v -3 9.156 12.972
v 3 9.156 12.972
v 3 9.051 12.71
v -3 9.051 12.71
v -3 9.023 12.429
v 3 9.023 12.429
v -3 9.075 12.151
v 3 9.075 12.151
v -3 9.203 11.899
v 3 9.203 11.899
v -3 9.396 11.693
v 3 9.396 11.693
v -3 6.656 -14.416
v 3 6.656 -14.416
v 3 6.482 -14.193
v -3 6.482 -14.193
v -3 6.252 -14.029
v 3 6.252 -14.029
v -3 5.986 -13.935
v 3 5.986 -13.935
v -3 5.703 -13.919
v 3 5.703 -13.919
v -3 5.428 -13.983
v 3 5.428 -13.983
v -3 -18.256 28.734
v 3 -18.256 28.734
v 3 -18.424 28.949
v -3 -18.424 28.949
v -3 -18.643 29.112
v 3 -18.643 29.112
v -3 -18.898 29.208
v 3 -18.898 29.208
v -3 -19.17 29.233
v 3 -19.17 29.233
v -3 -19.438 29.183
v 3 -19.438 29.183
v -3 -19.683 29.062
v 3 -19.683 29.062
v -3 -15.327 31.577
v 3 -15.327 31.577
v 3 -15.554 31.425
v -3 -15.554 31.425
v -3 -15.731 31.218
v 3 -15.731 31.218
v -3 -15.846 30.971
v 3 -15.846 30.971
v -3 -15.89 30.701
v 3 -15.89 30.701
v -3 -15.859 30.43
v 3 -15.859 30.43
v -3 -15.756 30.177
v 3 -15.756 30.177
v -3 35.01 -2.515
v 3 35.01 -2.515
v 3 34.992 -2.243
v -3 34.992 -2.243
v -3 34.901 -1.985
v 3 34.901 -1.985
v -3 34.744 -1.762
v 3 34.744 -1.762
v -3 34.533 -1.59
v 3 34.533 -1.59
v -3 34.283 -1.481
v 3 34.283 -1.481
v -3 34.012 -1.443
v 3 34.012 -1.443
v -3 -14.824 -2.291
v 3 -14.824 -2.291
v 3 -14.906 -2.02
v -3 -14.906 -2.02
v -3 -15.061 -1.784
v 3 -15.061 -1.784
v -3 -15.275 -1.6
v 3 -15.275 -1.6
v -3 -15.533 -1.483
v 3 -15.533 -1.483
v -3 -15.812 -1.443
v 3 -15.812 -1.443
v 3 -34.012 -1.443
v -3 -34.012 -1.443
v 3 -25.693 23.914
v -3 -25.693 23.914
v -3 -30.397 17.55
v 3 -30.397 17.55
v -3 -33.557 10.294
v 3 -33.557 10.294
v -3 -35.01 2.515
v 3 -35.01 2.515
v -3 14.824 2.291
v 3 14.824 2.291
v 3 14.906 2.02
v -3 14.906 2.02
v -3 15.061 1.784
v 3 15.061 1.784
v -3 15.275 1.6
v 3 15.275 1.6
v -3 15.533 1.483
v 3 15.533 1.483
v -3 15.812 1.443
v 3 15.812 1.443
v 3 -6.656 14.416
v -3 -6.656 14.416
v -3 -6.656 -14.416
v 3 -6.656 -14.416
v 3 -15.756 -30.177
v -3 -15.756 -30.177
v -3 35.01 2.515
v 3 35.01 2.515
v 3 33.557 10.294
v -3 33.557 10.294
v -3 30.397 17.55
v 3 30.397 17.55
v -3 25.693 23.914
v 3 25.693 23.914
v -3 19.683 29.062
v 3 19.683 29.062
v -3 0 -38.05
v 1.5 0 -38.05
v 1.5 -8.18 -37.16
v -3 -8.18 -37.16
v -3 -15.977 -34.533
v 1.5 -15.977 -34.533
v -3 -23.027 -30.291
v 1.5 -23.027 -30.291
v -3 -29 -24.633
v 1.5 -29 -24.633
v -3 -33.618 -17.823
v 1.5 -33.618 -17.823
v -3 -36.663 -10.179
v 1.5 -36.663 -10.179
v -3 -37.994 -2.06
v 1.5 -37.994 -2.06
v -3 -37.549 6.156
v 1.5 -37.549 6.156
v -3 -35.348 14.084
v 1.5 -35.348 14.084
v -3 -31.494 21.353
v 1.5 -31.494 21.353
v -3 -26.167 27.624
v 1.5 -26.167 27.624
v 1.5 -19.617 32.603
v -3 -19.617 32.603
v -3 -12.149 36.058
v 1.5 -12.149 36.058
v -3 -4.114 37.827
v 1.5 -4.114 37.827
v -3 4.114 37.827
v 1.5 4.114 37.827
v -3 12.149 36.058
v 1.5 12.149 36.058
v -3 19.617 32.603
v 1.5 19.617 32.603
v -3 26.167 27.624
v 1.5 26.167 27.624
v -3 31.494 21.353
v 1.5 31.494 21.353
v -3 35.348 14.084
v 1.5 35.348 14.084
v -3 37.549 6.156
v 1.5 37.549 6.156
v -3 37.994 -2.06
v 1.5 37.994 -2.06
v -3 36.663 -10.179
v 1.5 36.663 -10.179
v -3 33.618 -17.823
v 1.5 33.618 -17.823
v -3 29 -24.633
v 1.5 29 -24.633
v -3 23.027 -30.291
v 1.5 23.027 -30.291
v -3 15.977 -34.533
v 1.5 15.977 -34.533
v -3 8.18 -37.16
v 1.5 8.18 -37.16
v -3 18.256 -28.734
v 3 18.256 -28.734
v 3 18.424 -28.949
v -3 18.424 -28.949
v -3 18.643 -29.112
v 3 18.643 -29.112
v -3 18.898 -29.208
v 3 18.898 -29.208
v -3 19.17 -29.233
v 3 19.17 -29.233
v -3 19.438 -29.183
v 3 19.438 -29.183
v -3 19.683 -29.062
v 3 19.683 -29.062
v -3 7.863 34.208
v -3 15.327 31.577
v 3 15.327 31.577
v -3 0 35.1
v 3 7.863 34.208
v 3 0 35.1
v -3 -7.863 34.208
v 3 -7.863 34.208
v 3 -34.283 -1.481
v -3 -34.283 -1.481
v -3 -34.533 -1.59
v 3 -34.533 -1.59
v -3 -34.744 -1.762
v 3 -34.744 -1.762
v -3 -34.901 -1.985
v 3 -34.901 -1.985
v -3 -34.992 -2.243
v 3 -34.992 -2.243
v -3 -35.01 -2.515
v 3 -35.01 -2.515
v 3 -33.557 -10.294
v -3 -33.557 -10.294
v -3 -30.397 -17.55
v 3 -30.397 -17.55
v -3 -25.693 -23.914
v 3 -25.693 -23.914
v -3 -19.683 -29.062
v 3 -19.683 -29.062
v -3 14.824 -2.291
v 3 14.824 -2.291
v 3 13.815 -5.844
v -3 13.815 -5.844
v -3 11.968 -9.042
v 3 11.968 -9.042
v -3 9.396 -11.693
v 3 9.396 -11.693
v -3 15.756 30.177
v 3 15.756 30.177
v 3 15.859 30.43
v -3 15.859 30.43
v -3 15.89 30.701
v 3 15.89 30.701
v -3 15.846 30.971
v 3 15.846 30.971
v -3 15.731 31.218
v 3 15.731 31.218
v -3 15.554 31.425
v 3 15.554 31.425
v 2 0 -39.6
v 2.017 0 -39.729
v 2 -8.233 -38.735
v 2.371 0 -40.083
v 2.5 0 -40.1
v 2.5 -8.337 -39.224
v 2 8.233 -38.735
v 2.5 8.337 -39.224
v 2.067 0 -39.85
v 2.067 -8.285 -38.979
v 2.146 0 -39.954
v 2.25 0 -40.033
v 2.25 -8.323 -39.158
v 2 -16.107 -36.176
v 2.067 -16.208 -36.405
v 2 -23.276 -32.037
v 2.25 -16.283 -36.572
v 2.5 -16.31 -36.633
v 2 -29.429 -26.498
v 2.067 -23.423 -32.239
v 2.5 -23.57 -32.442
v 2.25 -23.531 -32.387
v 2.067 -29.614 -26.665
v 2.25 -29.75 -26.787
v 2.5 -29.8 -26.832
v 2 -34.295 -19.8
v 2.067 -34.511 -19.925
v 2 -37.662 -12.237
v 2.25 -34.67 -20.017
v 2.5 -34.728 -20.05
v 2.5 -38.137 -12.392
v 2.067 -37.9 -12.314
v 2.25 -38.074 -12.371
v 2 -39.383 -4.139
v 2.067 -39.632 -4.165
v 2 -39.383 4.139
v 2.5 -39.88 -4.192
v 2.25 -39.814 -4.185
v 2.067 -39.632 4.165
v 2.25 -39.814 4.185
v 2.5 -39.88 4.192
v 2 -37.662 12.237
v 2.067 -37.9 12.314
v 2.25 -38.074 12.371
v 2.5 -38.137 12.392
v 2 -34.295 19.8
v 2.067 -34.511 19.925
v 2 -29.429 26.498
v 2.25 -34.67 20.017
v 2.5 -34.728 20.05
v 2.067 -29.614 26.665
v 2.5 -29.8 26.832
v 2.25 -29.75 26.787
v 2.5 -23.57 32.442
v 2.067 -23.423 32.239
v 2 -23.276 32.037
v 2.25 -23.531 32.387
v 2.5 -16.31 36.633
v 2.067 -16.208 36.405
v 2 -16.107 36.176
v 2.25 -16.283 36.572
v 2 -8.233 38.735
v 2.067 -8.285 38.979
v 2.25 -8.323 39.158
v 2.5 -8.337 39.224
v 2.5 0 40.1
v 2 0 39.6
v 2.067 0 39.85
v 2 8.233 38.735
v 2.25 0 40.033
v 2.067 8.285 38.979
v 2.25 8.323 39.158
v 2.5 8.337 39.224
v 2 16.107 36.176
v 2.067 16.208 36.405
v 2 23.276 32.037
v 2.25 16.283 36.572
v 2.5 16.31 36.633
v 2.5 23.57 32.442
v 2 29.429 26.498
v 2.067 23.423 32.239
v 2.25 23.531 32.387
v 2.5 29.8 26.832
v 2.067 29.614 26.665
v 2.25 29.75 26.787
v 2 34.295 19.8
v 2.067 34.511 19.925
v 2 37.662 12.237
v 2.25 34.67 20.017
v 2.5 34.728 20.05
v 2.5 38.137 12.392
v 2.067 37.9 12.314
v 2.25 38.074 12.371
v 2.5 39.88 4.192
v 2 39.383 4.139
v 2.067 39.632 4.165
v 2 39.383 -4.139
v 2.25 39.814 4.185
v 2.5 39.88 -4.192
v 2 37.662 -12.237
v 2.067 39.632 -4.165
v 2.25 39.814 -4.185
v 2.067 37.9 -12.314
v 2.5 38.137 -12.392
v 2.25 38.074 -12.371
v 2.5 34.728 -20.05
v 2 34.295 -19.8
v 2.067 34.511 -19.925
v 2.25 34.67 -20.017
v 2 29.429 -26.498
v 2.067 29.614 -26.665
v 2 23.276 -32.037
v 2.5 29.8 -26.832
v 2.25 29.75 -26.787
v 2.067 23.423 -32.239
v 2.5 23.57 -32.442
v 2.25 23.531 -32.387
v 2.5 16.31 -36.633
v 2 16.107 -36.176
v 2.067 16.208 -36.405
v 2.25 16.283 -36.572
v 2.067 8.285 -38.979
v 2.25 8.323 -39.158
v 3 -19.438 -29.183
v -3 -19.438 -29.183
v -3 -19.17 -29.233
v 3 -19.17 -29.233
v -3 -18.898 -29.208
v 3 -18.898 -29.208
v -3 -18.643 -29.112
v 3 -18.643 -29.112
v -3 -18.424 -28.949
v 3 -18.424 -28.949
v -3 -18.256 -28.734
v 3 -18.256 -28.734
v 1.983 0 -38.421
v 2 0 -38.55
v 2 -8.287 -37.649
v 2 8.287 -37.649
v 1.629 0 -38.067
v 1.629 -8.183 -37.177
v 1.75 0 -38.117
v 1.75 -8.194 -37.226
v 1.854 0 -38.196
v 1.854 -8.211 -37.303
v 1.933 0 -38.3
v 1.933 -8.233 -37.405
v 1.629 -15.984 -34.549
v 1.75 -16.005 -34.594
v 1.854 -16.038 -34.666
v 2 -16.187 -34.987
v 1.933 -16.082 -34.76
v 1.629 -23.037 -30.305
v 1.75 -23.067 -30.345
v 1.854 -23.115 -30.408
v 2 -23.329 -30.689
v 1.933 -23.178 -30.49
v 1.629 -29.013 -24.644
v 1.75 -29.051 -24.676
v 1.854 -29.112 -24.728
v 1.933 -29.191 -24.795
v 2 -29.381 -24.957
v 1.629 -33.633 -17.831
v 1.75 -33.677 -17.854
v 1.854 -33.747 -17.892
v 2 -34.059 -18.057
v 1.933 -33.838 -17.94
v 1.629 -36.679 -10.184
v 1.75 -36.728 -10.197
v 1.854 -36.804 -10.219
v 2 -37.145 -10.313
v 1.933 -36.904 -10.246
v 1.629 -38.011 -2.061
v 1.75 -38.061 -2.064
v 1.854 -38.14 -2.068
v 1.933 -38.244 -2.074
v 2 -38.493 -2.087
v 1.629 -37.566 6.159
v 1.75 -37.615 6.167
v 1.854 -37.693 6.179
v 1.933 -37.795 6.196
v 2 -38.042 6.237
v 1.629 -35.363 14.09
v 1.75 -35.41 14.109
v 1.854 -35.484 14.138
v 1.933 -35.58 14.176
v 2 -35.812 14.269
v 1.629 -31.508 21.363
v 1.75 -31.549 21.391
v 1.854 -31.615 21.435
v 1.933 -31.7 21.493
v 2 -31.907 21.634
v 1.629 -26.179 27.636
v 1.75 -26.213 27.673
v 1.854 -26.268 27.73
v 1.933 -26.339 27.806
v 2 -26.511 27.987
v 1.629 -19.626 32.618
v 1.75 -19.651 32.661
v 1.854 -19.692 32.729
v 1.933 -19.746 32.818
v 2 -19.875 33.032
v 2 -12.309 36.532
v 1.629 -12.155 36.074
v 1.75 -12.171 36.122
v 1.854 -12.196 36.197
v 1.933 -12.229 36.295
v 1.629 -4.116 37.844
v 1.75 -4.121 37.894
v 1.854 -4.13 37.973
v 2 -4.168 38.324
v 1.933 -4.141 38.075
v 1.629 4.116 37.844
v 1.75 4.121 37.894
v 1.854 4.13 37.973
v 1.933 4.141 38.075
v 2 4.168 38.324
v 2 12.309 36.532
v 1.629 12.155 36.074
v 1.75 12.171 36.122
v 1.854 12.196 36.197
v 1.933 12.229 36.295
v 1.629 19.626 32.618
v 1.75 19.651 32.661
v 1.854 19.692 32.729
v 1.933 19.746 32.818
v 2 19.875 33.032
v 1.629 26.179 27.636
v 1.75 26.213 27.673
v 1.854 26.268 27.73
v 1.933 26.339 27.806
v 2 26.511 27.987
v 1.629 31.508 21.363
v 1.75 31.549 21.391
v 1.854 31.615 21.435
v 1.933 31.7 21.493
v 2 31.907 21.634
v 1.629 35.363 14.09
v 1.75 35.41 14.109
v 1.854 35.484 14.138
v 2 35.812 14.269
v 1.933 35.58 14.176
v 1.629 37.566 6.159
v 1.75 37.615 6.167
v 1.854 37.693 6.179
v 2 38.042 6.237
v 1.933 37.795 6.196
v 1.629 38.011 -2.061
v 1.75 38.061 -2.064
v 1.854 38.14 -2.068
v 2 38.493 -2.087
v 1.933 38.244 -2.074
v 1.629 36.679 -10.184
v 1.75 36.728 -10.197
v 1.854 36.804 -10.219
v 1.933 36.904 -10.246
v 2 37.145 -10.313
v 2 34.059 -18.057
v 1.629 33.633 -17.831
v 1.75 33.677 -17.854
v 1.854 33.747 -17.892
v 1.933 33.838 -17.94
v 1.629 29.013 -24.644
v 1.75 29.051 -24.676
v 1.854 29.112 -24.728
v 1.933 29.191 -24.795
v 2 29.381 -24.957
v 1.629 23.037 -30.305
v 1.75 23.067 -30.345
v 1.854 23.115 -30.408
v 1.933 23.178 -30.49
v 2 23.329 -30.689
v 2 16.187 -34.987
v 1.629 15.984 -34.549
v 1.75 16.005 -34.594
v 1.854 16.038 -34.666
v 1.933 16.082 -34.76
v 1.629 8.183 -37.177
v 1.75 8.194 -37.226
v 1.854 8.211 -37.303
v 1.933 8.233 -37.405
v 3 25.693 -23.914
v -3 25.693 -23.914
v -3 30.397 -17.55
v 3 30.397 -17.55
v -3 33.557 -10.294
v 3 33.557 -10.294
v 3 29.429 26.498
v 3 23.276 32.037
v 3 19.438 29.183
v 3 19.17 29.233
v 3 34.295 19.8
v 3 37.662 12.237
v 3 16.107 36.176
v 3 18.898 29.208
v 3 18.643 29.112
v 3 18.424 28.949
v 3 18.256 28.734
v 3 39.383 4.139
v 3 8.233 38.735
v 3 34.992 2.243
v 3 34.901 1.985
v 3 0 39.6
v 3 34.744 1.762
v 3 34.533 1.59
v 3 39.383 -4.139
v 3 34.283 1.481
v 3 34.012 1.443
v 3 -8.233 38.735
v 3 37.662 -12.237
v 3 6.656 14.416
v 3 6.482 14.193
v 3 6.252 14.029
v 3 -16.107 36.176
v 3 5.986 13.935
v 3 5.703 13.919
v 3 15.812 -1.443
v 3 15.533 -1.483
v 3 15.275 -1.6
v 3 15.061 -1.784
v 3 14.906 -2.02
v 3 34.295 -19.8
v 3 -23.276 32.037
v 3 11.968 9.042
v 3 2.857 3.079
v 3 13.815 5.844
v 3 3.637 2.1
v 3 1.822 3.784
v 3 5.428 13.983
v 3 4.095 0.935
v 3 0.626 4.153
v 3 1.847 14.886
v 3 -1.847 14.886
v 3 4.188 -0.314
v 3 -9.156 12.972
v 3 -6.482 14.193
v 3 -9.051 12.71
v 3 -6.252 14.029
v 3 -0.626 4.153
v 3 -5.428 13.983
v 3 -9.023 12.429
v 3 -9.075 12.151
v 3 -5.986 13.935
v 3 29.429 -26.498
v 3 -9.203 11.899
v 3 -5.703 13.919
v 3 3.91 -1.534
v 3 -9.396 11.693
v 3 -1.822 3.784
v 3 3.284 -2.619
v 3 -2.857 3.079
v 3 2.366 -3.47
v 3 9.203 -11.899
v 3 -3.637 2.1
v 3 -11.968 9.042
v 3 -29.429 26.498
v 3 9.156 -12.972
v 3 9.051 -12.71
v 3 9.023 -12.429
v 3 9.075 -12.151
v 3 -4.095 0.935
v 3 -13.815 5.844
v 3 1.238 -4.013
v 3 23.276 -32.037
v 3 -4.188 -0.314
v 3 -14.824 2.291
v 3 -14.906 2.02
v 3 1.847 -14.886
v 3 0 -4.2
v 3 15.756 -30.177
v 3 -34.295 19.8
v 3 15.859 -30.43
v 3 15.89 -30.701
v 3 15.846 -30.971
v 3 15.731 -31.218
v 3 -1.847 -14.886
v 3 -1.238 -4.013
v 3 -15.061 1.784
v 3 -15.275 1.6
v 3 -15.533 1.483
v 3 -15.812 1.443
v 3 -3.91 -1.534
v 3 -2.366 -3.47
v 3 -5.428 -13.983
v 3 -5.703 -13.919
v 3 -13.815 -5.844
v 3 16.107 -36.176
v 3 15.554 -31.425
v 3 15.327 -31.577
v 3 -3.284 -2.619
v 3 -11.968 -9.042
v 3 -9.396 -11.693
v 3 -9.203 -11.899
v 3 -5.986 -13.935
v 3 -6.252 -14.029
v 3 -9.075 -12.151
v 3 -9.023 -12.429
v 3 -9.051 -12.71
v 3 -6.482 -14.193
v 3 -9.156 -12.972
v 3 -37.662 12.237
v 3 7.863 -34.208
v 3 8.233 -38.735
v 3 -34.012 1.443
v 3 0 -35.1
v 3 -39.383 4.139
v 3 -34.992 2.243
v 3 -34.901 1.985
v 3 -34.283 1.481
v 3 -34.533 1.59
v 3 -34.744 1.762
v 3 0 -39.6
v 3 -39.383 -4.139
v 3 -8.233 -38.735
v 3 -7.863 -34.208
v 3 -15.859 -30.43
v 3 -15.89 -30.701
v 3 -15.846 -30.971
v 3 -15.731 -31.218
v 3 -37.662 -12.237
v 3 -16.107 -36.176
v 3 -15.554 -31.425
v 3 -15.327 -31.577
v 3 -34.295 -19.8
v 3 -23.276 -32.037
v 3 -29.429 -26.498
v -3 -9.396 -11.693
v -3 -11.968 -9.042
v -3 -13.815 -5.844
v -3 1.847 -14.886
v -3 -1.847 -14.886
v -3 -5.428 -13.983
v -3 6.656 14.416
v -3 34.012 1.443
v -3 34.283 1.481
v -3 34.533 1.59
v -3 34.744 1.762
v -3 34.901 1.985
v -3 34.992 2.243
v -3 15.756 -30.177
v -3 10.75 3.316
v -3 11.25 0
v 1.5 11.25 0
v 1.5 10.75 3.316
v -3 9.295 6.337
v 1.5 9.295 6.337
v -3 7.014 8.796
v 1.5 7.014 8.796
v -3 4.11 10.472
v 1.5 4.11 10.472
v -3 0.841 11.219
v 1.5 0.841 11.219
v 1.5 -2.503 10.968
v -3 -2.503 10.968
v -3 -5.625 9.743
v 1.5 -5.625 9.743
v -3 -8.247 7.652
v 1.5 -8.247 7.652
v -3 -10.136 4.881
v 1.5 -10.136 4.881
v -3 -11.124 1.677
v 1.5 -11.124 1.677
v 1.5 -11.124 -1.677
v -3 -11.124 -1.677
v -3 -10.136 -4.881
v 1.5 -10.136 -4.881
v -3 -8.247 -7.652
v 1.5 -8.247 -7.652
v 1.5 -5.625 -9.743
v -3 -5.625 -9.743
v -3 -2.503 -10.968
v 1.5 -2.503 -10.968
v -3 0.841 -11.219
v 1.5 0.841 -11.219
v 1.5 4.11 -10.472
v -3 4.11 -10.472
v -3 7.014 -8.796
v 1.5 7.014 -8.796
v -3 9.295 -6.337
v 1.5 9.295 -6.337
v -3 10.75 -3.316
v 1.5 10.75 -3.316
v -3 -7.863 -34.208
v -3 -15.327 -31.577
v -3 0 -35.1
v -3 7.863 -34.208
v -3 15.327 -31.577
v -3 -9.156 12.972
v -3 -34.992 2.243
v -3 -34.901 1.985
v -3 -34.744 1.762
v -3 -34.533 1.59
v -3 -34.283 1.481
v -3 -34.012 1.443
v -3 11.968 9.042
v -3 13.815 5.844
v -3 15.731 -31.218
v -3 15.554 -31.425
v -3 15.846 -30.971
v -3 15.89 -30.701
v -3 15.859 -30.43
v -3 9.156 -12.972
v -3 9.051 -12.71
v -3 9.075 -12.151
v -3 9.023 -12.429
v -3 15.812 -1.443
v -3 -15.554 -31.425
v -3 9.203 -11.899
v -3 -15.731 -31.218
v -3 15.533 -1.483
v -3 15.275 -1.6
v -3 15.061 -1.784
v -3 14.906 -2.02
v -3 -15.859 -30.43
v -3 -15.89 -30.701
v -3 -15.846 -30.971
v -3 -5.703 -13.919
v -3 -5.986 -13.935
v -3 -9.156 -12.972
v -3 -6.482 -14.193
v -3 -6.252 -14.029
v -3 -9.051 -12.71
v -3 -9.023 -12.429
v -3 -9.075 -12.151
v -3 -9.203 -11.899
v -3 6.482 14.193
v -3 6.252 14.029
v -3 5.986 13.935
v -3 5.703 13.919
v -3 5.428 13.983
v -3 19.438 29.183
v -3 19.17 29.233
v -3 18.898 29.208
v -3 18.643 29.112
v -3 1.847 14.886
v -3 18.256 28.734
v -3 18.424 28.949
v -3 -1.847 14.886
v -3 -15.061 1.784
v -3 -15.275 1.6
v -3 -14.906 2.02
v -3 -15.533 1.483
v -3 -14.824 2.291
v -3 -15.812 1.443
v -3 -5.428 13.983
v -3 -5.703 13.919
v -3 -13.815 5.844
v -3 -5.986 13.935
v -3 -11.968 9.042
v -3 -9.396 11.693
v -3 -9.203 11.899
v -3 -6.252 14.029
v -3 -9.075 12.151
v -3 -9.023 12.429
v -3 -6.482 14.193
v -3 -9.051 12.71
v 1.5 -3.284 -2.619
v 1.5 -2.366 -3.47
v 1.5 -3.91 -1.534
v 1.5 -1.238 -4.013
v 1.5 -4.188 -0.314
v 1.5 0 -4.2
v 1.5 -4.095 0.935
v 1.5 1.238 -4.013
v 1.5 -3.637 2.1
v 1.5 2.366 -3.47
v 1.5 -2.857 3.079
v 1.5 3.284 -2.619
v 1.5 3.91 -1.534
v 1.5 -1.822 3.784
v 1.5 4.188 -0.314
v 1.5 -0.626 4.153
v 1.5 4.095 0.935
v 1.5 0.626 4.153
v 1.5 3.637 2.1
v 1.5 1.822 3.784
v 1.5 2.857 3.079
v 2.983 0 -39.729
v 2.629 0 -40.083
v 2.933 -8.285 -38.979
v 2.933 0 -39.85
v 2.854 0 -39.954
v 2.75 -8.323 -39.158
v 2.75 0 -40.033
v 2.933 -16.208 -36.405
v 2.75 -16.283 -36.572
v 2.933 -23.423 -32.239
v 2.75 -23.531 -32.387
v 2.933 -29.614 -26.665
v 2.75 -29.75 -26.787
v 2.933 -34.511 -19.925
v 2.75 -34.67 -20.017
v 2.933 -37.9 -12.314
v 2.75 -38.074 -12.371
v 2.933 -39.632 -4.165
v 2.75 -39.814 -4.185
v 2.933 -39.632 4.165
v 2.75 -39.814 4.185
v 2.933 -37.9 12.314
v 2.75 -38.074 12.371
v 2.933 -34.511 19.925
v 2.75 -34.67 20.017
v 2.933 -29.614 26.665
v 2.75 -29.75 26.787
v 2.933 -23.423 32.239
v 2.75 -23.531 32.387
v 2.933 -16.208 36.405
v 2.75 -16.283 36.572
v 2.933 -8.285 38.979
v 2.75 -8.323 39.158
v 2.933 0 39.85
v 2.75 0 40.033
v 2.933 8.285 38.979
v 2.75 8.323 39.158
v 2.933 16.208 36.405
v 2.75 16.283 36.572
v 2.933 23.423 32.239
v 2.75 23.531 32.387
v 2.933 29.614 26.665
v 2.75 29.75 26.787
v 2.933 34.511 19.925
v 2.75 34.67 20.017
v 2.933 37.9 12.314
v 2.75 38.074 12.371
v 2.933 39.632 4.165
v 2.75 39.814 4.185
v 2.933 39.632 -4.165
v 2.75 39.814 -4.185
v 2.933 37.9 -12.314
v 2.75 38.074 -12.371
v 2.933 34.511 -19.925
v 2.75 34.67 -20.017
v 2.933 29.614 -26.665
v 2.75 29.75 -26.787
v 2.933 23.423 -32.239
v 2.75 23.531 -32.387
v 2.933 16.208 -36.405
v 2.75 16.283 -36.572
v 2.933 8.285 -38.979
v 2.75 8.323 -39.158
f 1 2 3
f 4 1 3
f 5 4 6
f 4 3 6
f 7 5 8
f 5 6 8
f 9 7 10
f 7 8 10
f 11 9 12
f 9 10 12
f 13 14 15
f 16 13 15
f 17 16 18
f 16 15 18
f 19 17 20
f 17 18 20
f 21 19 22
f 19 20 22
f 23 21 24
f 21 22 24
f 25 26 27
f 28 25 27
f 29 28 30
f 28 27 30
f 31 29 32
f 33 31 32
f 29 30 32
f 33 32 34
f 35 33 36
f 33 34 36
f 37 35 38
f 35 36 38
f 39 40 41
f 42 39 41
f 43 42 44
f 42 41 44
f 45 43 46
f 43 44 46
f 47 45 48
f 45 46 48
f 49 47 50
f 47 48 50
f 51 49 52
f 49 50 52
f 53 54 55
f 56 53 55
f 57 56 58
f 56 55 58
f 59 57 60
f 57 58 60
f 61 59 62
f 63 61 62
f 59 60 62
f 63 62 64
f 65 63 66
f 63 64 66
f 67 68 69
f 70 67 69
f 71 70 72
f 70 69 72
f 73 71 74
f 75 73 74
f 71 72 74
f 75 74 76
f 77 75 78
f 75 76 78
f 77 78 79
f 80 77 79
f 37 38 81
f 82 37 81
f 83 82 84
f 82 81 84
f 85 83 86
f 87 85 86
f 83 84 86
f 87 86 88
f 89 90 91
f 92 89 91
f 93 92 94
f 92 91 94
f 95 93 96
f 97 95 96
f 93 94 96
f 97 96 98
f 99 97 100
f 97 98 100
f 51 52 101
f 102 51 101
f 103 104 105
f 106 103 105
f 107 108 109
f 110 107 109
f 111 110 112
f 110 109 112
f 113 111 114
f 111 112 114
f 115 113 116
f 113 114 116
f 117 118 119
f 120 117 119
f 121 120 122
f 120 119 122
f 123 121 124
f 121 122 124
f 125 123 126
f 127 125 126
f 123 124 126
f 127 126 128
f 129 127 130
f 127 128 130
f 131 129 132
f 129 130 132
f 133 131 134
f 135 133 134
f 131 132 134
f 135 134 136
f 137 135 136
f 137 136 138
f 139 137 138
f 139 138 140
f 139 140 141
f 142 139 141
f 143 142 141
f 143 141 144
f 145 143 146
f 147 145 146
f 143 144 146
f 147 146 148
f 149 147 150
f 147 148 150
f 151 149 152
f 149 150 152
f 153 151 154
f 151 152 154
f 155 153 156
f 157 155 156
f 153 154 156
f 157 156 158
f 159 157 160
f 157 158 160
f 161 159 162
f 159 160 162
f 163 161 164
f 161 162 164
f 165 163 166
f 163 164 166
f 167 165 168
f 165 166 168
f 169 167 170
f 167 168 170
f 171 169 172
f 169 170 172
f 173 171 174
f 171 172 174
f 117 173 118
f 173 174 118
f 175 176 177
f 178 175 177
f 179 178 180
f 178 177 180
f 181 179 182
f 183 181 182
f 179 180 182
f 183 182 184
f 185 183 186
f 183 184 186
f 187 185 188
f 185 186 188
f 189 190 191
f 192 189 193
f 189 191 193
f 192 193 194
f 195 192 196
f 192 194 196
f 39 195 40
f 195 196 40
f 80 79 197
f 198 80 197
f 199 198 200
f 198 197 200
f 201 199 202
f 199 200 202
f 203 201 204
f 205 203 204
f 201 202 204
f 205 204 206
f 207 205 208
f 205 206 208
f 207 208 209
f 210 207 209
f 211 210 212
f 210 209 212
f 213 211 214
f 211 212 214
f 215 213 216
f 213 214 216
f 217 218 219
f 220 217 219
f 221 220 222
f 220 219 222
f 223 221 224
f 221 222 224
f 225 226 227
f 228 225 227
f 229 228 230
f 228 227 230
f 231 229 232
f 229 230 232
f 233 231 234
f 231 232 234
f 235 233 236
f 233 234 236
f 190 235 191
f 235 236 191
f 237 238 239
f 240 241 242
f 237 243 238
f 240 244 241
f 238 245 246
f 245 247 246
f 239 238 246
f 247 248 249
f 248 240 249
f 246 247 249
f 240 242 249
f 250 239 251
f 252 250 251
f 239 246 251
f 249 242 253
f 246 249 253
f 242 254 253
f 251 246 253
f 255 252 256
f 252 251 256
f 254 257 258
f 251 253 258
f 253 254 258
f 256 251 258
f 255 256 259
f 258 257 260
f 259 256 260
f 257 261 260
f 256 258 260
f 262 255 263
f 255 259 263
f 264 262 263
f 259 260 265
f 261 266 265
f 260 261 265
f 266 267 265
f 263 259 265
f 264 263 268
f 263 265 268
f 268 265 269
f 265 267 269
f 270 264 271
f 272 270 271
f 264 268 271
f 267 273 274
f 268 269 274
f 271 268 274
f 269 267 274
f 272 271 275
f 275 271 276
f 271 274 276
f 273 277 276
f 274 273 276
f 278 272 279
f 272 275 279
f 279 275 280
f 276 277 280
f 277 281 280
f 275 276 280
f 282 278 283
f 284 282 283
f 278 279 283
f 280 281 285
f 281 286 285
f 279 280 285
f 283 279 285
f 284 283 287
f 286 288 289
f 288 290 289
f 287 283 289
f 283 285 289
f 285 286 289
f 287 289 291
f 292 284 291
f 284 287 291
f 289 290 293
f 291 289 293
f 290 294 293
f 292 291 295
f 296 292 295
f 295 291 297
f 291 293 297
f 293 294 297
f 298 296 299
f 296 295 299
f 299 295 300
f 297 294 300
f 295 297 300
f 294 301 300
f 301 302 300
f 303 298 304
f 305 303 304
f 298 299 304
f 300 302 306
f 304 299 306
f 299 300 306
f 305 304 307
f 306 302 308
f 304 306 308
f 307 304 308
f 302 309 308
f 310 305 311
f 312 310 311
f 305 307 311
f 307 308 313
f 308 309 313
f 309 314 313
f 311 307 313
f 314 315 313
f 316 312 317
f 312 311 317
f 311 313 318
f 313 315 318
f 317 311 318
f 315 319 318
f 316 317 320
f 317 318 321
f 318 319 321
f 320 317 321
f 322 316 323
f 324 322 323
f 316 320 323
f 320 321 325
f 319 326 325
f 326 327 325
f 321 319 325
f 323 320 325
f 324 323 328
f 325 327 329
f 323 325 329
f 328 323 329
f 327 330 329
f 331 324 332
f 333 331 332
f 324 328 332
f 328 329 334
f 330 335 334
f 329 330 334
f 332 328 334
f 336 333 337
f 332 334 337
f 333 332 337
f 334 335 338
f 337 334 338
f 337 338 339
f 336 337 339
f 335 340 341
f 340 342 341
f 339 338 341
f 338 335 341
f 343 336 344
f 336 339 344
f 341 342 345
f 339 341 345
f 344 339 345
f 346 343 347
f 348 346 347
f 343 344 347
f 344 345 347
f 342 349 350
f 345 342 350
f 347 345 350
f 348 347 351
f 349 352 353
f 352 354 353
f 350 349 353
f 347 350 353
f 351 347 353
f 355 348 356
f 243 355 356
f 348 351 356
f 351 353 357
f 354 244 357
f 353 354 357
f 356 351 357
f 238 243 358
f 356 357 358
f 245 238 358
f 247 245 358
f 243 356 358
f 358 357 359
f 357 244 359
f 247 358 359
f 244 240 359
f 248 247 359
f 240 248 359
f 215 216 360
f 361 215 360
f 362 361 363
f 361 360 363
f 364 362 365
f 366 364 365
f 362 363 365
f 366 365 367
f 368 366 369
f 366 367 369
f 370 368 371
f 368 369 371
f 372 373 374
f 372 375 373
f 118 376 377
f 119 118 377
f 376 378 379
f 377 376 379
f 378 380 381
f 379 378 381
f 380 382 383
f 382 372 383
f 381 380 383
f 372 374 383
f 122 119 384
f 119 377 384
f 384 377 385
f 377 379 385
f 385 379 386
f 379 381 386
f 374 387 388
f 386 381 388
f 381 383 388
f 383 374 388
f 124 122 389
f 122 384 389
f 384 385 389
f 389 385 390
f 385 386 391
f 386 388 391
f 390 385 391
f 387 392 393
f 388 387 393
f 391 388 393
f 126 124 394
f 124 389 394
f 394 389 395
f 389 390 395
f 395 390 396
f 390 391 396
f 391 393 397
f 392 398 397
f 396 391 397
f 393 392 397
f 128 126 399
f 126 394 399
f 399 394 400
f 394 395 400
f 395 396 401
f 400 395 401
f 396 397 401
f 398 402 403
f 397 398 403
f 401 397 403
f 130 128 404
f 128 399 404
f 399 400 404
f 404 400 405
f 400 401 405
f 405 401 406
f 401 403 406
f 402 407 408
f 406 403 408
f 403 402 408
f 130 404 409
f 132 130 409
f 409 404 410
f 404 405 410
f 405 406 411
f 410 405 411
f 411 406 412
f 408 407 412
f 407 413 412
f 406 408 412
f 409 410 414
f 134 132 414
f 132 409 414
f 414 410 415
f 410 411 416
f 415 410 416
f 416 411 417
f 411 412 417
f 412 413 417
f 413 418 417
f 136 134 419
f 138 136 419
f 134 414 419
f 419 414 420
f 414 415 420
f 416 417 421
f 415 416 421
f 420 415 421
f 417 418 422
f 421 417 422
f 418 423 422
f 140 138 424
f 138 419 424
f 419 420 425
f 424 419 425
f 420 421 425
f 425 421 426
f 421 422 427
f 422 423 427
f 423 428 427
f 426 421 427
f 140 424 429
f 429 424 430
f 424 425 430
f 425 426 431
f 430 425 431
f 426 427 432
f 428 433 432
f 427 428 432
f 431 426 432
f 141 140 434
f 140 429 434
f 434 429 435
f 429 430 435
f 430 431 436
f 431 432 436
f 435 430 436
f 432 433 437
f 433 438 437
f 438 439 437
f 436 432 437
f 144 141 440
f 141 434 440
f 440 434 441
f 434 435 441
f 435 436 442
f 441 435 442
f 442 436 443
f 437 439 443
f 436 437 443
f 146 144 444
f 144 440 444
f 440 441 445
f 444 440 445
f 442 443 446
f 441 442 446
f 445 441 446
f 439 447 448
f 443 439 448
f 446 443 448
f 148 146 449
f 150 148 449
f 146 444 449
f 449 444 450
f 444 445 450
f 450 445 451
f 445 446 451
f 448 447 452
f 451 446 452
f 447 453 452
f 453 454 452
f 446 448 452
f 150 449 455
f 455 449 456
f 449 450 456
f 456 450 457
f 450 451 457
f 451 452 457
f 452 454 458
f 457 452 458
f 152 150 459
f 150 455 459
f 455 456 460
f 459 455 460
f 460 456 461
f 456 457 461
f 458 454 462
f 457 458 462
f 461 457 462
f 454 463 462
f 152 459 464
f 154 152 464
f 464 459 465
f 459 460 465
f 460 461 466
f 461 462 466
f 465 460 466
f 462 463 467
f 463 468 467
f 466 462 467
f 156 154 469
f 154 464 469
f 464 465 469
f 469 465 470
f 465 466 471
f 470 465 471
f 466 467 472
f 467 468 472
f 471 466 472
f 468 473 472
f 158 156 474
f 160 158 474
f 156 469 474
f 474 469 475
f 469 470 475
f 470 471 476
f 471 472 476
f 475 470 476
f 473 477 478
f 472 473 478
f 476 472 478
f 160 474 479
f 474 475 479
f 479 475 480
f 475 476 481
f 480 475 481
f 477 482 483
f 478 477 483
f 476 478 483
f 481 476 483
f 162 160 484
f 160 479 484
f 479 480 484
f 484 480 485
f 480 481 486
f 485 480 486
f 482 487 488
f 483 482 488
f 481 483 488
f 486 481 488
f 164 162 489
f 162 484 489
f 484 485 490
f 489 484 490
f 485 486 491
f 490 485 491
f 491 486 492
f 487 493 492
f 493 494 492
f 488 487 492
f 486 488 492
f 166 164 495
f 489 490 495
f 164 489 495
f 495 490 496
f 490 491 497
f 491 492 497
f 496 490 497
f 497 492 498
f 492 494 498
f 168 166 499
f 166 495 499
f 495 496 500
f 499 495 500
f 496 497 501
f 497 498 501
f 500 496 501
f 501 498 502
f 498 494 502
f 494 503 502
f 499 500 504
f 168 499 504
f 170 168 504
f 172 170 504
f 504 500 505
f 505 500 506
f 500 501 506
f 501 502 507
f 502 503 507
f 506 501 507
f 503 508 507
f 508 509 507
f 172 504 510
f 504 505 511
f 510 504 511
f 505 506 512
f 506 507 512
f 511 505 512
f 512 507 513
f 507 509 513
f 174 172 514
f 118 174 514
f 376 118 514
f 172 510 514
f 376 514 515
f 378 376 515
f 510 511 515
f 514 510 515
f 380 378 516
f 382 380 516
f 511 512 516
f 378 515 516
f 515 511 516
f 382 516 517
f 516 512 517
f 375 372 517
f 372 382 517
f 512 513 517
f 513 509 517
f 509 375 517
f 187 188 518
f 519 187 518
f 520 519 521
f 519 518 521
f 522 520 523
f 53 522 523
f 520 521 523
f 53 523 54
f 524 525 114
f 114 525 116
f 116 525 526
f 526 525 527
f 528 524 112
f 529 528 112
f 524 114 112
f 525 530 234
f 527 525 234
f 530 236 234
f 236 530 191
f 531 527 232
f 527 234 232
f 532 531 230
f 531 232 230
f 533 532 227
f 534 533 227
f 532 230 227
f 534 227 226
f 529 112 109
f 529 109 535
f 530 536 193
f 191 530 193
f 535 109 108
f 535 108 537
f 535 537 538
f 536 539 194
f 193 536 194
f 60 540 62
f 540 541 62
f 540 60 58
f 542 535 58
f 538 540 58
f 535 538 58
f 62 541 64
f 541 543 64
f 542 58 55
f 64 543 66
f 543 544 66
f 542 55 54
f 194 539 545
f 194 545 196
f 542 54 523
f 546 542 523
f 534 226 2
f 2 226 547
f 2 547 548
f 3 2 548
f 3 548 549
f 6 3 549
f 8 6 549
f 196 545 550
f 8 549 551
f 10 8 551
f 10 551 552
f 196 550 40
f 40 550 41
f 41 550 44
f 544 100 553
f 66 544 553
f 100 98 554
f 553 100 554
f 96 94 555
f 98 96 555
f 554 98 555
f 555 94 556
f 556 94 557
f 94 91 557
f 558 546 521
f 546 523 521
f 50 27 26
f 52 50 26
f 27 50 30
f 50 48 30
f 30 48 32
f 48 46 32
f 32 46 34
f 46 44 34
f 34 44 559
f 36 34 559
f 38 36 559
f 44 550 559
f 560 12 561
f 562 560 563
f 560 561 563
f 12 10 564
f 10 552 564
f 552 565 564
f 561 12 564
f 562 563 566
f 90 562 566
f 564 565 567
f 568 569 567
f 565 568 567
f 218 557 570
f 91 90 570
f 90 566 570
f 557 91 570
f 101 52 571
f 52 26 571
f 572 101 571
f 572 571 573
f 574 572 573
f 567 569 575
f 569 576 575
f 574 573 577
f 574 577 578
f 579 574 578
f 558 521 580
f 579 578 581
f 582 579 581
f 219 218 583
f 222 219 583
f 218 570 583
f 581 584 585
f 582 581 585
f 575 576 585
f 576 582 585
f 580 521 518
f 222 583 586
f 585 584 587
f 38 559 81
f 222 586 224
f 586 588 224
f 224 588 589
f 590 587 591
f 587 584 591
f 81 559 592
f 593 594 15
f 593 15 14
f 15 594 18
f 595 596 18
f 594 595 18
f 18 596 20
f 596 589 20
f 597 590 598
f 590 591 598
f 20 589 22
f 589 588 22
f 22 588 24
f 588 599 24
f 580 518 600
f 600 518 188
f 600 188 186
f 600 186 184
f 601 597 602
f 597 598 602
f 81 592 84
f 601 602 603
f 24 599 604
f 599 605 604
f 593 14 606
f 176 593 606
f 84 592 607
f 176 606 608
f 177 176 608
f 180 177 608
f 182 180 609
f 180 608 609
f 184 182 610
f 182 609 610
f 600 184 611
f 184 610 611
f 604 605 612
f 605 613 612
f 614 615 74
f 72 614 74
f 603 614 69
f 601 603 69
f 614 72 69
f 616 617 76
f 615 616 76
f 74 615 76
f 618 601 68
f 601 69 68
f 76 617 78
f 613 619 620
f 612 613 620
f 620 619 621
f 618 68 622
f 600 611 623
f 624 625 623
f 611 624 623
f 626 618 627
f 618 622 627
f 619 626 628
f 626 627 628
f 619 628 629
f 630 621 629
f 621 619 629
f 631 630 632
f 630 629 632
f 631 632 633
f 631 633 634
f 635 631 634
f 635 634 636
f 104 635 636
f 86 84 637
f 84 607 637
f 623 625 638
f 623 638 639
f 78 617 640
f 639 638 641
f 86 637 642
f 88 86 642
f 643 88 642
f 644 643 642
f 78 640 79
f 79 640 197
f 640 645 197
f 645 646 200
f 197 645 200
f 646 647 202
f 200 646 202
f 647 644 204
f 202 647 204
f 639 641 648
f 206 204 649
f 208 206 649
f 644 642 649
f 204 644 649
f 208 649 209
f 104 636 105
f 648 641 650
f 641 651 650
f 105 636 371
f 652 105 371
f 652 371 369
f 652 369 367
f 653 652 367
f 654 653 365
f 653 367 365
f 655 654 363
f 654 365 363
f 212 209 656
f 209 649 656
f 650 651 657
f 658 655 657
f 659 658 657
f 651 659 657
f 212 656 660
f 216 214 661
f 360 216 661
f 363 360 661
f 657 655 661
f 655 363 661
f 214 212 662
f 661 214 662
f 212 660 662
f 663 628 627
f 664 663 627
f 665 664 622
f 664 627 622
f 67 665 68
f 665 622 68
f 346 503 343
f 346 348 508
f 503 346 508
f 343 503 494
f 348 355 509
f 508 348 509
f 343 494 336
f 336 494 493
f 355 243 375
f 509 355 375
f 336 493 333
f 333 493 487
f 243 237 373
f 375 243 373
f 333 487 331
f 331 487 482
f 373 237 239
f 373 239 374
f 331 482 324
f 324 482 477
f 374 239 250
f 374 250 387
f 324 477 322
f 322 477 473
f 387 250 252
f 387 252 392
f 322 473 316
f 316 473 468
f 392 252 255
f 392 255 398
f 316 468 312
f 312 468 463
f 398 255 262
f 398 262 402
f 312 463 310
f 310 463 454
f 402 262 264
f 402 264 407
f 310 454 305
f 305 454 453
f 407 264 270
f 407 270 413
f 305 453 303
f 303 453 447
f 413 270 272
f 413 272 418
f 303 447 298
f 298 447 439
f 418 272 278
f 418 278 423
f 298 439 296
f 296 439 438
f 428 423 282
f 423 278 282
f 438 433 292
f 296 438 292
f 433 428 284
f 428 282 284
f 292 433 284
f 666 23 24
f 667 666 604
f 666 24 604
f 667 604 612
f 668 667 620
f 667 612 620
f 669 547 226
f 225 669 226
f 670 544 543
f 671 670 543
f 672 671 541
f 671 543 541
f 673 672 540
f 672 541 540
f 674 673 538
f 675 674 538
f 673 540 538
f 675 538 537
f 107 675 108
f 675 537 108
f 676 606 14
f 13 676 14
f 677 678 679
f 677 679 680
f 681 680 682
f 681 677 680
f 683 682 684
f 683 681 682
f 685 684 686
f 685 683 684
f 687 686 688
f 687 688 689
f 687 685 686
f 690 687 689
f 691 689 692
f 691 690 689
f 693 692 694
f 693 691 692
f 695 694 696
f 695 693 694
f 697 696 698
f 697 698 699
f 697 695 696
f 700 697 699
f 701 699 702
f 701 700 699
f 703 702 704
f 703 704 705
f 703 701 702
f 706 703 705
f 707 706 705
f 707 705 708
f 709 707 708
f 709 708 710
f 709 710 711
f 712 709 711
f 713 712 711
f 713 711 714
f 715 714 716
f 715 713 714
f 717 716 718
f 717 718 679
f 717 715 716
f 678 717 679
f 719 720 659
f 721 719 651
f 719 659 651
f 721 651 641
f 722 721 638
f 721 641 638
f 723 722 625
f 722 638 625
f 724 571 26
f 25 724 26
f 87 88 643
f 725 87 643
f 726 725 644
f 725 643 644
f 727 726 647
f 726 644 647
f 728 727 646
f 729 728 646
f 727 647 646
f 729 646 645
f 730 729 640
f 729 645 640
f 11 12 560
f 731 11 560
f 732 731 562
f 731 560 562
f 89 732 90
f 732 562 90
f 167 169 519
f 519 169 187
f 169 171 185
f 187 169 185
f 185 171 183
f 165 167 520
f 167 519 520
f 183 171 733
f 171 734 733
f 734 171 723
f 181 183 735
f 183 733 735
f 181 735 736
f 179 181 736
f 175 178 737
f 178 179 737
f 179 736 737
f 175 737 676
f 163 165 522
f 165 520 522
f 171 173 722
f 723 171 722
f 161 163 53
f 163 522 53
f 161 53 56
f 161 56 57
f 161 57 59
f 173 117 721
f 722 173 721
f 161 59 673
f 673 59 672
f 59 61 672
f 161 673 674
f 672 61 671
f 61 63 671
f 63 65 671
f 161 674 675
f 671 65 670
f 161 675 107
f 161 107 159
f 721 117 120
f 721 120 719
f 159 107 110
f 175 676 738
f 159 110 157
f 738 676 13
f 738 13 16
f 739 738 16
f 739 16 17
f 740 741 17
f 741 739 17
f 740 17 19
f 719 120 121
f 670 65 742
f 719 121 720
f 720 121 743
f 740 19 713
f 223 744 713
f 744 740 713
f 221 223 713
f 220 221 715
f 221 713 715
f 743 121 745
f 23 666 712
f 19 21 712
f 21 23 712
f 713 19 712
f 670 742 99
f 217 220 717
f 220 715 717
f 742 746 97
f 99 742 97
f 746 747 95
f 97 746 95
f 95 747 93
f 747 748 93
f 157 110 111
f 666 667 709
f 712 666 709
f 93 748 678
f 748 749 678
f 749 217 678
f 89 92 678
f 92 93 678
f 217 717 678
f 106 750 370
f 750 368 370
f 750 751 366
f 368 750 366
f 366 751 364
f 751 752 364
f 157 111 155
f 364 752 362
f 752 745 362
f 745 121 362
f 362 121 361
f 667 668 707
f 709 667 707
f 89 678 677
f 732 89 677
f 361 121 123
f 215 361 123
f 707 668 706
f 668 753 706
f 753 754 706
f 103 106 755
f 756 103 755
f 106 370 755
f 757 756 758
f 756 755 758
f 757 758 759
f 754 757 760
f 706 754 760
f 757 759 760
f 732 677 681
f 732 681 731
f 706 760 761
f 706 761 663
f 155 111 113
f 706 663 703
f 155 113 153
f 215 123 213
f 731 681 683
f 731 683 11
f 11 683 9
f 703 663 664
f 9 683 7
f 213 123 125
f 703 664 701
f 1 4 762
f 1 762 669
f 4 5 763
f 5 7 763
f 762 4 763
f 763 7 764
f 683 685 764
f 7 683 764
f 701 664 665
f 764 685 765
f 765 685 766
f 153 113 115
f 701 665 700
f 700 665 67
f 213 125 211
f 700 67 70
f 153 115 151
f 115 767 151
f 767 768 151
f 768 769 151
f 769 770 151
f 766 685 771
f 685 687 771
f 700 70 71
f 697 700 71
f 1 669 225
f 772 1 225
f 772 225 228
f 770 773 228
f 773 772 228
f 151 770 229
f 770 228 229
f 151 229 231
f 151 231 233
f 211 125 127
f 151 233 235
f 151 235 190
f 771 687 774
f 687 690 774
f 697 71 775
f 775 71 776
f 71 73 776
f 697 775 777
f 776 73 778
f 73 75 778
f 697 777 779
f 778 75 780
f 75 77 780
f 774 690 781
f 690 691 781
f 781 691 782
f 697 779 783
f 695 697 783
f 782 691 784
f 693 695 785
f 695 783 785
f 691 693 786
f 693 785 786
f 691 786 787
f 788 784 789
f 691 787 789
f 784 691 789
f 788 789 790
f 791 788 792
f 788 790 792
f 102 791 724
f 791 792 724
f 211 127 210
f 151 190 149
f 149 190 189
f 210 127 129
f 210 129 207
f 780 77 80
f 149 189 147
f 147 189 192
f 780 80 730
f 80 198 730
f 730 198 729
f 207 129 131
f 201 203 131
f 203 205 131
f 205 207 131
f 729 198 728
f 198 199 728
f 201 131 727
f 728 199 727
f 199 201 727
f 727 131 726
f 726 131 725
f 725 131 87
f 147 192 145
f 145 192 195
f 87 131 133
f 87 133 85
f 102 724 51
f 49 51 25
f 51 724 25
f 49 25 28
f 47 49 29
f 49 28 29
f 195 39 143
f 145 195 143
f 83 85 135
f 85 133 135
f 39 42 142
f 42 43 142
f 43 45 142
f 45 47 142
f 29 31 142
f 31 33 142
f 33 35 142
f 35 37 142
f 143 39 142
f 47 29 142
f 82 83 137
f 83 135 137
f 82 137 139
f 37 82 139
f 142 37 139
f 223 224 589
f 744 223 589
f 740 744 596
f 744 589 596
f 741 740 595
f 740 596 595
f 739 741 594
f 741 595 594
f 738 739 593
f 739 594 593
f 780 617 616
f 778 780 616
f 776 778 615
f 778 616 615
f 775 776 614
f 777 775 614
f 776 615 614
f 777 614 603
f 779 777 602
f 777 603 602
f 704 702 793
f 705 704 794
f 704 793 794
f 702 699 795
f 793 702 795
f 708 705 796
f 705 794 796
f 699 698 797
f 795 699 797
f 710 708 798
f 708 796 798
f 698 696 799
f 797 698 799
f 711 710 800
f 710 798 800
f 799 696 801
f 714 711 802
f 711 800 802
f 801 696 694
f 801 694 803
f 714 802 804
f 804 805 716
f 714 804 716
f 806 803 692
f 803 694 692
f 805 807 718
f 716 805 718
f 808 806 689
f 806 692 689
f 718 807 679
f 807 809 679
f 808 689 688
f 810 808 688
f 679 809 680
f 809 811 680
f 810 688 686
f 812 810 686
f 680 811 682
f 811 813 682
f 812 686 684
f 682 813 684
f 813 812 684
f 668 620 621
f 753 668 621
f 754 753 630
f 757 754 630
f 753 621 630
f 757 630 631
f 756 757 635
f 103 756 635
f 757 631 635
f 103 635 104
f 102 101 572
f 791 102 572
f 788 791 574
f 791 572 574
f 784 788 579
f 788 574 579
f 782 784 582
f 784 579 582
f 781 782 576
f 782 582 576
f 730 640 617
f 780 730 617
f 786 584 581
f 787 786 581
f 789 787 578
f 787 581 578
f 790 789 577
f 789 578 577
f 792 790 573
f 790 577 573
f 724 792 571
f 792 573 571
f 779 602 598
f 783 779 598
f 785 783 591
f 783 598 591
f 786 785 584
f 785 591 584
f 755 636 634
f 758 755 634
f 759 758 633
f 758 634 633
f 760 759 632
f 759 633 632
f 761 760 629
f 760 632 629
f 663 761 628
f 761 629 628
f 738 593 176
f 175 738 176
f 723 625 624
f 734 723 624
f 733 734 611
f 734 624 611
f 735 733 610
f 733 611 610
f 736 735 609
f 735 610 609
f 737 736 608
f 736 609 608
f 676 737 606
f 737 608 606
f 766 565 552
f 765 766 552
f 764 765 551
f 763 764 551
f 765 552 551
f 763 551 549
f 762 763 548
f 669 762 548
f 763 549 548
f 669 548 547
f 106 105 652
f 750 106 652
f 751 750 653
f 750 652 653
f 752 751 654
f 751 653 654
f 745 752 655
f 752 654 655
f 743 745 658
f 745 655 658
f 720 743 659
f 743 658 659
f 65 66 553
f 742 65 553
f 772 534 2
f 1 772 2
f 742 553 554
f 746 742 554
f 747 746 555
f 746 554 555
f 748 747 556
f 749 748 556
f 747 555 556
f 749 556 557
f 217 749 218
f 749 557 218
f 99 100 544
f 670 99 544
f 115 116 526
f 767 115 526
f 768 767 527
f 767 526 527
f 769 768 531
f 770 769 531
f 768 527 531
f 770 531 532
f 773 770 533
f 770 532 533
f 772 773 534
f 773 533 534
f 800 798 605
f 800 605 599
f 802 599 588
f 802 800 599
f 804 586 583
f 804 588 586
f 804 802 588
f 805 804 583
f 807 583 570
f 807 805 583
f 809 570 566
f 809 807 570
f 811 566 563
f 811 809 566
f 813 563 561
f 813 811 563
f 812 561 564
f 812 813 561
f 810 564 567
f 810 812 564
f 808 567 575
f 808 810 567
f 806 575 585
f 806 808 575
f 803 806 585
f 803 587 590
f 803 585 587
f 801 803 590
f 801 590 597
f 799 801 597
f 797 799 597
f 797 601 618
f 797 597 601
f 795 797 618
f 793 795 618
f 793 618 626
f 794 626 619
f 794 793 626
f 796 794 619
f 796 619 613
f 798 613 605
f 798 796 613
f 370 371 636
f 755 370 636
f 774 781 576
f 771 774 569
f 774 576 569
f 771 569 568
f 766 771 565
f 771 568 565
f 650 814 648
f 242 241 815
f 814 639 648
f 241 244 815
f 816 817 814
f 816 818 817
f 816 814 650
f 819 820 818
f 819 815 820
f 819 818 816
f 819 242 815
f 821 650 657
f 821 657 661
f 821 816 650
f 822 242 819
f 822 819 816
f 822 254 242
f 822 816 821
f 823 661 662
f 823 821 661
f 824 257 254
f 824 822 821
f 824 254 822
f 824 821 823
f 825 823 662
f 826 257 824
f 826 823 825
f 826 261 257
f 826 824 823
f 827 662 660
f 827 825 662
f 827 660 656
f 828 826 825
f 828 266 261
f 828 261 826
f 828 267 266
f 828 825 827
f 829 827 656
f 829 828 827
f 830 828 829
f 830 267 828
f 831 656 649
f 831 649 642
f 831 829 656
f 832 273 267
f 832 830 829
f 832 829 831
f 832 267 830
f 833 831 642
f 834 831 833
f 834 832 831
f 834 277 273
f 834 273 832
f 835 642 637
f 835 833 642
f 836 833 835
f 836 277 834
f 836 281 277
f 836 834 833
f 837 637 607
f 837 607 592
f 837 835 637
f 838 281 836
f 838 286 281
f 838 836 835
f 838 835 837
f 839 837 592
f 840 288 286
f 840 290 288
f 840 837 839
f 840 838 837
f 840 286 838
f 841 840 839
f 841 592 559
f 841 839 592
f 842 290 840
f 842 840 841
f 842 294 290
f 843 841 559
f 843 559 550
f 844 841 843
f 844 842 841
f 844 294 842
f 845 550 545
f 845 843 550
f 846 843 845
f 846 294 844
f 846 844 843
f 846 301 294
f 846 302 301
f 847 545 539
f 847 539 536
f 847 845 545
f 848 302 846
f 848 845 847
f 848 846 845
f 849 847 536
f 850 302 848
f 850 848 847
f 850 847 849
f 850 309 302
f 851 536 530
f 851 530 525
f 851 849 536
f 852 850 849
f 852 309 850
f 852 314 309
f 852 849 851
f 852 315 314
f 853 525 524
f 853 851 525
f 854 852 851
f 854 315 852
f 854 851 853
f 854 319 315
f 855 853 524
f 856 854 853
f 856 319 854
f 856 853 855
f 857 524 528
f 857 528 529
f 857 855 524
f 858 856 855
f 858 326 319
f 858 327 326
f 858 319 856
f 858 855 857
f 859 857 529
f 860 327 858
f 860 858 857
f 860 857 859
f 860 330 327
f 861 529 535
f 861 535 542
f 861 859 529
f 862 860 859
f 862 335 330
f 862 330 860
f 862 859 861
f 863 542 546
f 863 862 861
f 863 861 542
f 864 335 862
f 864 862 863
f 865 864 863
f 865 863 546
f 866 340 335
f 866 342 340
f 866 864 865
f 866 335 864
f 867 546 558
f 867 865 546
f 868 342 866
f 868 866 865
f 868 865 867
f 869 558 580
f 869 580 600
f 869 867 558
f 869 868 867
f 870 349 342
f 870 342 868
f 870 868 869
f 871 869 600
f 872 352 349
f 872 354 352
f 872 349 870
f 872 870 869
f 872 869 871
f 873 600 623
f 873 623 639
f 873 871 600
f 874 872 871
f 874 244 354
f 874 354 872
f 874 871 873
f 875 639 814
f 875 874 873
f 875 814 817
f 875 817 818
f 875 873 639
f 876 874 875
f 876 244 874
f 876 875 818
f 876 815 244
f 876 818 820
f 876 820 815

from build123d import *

# Parameters (mm, degrees)
CUT_EXTRUDE2_DEPTH      = 58.026485075
FILLET1_R               = 0.5
CUT_EXTRUDE5_DEPTH      = 58.026485145
CUT_EXTRUDE5_DEPTH_BACK = 58.026485145
SKETCH7_R               = 4.2
SKETCH8_R               = 11.25
CUT_EXTRUDE6_DEPTH      = 4.5


with BuildPart() as part:
    # Sketch1 → Revolve2 (revolve)
    with BuildSketch(Plane.XY, mode=Mode.PRIVATE) as revolve2_sk:
        Polygon((-3, 0), (-3, 38.05), (2, 38.05), (2, 40.1), (3, 40.1), (3, 0), align=None)
    revolve(revolve2_sk.sketch.rotate(Axis((3, 0, 0), (-1, 0, 0)), 90), axis=Axis((3, 0, 0), (-1, 0, 0)))

    # Sketch2 → Cut-Extrude2 (cut, through all)
    with BuildSketch(Plane.ZY.offset(-3)):
        with BuildLine():
            Line((14.415571014, 6.656167139), (30.177246505, 15.756174727))
            ThreePointArc((30.177246505, 15.756174727), (30.970527299, 15.84617567), (31.576872502, 15.326810593))
            ThreePointArc((31.576872502, 15.326810593), (35.1, 0), (31.576872502, -15.326810593))
            ThreePointArc((31.576872502, -15.326810593), (30.970527299, -15.84617567), (30.177246505, -15.756174727))
            Line((30.177246505, -15.756174727), (14.415571014, -6.656167139))
            ThreePointArc((14.415571014, -6.656167139), (13.972302174, -6.122171697), (13.983347826, -5.428257877))
            ThreePointArc((13.983347826, -5.428257877), (15, 0), (13.983347826, 5.428257877))
            ThreePointArc((13.983347826, 5.428257877), (13.972302174, 6.122171697), (14.415571014, 6.656167139))
        make_face()
        with BuildLine():
            Line((12.972195341, -9.156167139), (28.733870832, -18.256174727))
            ThreePointArc((28.733870832, -18.256174727), (29.208454332, -18.898175575), (29.061843584, -19.682968463))
            ThreePointArc((29.061843584, -19.682968463), (17.55, -30.397491673), (2.515028919, -35.009779056))
            ThreePointArc((2.515028919, -35.009779056), (1.762072967, -34.744351245), (1.443375673, -34.012349453))
            Line((1.443375673, -34.012349453), (1.443375673, -15.812334278))
            ThreePointArc((1.443375673, -15.812334278), (1.684194871, -15.161454481), (2.290664693, -14.824063386))
            ThreePointArc((2.290664693, -14.824063386), (7.5, -12.990381057), (11.692683133, -9.395805509))
            ThreePointArc((11.692683133, -9.395805509), (12.288107303, -9.039282784), (12.972195341, -9.156167139))
        make_face()
        with BuildLine():
            Line((-1.443375673, -15.812334278), (-1.443375673, -34.012349453))
            ThreePointArc((-1.443375673, -34.012349453), (-1.762072967, -34.744351245), (-2.515028919, -35.009779056))
            ThreePointArc((-2.515028919, -35.009779056), (-17.55, -30.397491673), (-29.061843584, -19.682968463))
            ThreePointArc((-29.061843584, -19.682968463), (-29.208454332, -18.898175575), (-28.733870832, -18.256174727))
            Line((-28.733870832, -18.256174727), (-12.972195341, -9.156167139))
            ThreePointArc((-12.972195341, -9.156167139), (-12.288107303, -9.039282784), (-11.692683133, -9.395805509))
            ThreePointArc((-11.692683133, -9.395805509), (-7.5, -12.990381057), (-2.290664693, -14.824063386))
            ThreePointArc((-2.290664693, -14.824063386), (-1.684194871, -15.161454481), (-1.443375673, -15.812334278))
        make_face()
        with BuildLine():
            Line((-14.415571014, -6.656167139), (-30.177246505, -15.756174727))
            ThreePointArc((-30.177246505, -15.756174727), (-30.970527299, -15.84617567), (-31.576872502, -15.326810593))
            ThreePointArc((-31.576872502, -15.326810593), (-35.1, 0), (-31.576872502, 15.326810593))
            ThreePointArc((-31.576872502, 15.326810593), (-30.970527299, 15.84617567), (-30.177246505, 15.756174727))
            Line((-30.177246505, 15.756174727), (-14.415571014, 6.656167139))
            ThreePointArc((-14.415571014, 6.656167139), (-13.972302174, 6.122171697), (-13.983347826, 5.428257877))
            ThreePointArc((-13.983347826, 5.428257877), (-15, 0), (-13.983347826, -5.428257877))
            ThreePointArc((-13.983347826, -5.428257877), (-13.972302174, -6.122171697), (-14.415571014, -6.656167139))
        make_face()
        with BuildLine():
            Line((-12.972195341, 9.156167139), (-28.733870832, 18.256174727))
            ThreePointArc((-28.733870832, 18.256174727), (-29.208454332, 18.898175575), (-29.061843584, 19.682968463))
            ThreePointArc((-29.061843584, 19.682968463), (-17.55, 30.397491673), (-2.515028919, 35.009779056))
            ThreePointArc((-2.515028919, 35.009779056), (-1.762072967, 34.744351245), (-1.443375673, 34.012349453))
            Line((-1.443375673, 34.012349453), (-1.443375673, 15.812334278))
            ThreePointArc((-1.443375673, 15.812334278), (-1.684194871, 15.161454481), (-2.290664693, 14.824063386))
            ThreePointArc((-2.290664693, 14.824063386), (-7.5, 12.990381057), (-11.692683133, 9.395805509))
            ThreePointArc((-11.692683133, 9.395805509), (-12.288107303, 9.039282784), (-12.972195341, 9.156167139))
        make_face()
        with BuildLine():
            Line((1.443375673, 15.812334278), (1.443375673, 34.012349453))
            ThreePointArc((1.443375673, 34.012349453), (1.762072967, 34.744351245), (2.515028919, 35.009779056))
            ThreePointArc((2.515028919, 35.009779056), (17.55, 30.397491673), (29.061843584, 19.682968463))
            ThreePointArc((29.061843584, 19.682968463), (29.208454332, 18.898175575), (28.733870832, 18.256174727))
            Line((28.733870832, 18.256174727), (12.972195341, 9.156167139))
            ThreePointArc((12.972195341, 9.156167139), (12.288107303, 9.039282784), (11.692683133, 9.395805509))
            ThreePointArc((11.692683133, 9.395805509), (7.5, 12.990381057), (2.290664693, 14.824063386))
            ThreePointArc((2.290664693, 14.824063386), (1.684194871, 15.161454481), (1.443375673, 15.812334278))
        make_face()
    extrude(amount=CUT_EXTRUDE2_DEPTH, mode=Mode.SUBTRACT)

    # Fillet1
    fillet1_edges = [part.edges().sort_by_distance(p)[0] for p in [
        (3, 0, 40.1),
        (2, 0, 40.1),
        (2, 0, 38.05),
    ]]
    fillet(fillet1_edges, radius=FILLET1_R - 0.0001)  # a hair under: the kernel refuses the full size

    # Sketch7 → Cut-Extrude5 (cut, two sides: drawn at the far end of the back side and taken through both)
    with BuildSketch(Plane(origin=(3, 0, 0), x_dir=(0, 0, -1), z_dir=(1, 0, 0)).offset(-CUT_EXTRUDE5_DEPTH_BACK)):
        Circle(SKETCH7_R)
    extrude(amount=CUT_EXTRUDE5_DEPTH + CUT_EXTRUDE5_DEPTH_BACK, mode=Mode.SUBTRACT)

    # Sketch8 → Cut-Extrude6 (cut)
    with BuildSketch(Plane(origin=(-3, 0, 0), x_dir=(0, 0, -1), z_dir=(1, 0, 0))):
        with Locations(Location((0, 0, 0), (0, 0, 90))):
            Circle(SKETCH8_R)
    extrude(amount=CUT_EXTRUDE6_DEPTH, mode=Mode.SUBTRACT)


solid = part.part
